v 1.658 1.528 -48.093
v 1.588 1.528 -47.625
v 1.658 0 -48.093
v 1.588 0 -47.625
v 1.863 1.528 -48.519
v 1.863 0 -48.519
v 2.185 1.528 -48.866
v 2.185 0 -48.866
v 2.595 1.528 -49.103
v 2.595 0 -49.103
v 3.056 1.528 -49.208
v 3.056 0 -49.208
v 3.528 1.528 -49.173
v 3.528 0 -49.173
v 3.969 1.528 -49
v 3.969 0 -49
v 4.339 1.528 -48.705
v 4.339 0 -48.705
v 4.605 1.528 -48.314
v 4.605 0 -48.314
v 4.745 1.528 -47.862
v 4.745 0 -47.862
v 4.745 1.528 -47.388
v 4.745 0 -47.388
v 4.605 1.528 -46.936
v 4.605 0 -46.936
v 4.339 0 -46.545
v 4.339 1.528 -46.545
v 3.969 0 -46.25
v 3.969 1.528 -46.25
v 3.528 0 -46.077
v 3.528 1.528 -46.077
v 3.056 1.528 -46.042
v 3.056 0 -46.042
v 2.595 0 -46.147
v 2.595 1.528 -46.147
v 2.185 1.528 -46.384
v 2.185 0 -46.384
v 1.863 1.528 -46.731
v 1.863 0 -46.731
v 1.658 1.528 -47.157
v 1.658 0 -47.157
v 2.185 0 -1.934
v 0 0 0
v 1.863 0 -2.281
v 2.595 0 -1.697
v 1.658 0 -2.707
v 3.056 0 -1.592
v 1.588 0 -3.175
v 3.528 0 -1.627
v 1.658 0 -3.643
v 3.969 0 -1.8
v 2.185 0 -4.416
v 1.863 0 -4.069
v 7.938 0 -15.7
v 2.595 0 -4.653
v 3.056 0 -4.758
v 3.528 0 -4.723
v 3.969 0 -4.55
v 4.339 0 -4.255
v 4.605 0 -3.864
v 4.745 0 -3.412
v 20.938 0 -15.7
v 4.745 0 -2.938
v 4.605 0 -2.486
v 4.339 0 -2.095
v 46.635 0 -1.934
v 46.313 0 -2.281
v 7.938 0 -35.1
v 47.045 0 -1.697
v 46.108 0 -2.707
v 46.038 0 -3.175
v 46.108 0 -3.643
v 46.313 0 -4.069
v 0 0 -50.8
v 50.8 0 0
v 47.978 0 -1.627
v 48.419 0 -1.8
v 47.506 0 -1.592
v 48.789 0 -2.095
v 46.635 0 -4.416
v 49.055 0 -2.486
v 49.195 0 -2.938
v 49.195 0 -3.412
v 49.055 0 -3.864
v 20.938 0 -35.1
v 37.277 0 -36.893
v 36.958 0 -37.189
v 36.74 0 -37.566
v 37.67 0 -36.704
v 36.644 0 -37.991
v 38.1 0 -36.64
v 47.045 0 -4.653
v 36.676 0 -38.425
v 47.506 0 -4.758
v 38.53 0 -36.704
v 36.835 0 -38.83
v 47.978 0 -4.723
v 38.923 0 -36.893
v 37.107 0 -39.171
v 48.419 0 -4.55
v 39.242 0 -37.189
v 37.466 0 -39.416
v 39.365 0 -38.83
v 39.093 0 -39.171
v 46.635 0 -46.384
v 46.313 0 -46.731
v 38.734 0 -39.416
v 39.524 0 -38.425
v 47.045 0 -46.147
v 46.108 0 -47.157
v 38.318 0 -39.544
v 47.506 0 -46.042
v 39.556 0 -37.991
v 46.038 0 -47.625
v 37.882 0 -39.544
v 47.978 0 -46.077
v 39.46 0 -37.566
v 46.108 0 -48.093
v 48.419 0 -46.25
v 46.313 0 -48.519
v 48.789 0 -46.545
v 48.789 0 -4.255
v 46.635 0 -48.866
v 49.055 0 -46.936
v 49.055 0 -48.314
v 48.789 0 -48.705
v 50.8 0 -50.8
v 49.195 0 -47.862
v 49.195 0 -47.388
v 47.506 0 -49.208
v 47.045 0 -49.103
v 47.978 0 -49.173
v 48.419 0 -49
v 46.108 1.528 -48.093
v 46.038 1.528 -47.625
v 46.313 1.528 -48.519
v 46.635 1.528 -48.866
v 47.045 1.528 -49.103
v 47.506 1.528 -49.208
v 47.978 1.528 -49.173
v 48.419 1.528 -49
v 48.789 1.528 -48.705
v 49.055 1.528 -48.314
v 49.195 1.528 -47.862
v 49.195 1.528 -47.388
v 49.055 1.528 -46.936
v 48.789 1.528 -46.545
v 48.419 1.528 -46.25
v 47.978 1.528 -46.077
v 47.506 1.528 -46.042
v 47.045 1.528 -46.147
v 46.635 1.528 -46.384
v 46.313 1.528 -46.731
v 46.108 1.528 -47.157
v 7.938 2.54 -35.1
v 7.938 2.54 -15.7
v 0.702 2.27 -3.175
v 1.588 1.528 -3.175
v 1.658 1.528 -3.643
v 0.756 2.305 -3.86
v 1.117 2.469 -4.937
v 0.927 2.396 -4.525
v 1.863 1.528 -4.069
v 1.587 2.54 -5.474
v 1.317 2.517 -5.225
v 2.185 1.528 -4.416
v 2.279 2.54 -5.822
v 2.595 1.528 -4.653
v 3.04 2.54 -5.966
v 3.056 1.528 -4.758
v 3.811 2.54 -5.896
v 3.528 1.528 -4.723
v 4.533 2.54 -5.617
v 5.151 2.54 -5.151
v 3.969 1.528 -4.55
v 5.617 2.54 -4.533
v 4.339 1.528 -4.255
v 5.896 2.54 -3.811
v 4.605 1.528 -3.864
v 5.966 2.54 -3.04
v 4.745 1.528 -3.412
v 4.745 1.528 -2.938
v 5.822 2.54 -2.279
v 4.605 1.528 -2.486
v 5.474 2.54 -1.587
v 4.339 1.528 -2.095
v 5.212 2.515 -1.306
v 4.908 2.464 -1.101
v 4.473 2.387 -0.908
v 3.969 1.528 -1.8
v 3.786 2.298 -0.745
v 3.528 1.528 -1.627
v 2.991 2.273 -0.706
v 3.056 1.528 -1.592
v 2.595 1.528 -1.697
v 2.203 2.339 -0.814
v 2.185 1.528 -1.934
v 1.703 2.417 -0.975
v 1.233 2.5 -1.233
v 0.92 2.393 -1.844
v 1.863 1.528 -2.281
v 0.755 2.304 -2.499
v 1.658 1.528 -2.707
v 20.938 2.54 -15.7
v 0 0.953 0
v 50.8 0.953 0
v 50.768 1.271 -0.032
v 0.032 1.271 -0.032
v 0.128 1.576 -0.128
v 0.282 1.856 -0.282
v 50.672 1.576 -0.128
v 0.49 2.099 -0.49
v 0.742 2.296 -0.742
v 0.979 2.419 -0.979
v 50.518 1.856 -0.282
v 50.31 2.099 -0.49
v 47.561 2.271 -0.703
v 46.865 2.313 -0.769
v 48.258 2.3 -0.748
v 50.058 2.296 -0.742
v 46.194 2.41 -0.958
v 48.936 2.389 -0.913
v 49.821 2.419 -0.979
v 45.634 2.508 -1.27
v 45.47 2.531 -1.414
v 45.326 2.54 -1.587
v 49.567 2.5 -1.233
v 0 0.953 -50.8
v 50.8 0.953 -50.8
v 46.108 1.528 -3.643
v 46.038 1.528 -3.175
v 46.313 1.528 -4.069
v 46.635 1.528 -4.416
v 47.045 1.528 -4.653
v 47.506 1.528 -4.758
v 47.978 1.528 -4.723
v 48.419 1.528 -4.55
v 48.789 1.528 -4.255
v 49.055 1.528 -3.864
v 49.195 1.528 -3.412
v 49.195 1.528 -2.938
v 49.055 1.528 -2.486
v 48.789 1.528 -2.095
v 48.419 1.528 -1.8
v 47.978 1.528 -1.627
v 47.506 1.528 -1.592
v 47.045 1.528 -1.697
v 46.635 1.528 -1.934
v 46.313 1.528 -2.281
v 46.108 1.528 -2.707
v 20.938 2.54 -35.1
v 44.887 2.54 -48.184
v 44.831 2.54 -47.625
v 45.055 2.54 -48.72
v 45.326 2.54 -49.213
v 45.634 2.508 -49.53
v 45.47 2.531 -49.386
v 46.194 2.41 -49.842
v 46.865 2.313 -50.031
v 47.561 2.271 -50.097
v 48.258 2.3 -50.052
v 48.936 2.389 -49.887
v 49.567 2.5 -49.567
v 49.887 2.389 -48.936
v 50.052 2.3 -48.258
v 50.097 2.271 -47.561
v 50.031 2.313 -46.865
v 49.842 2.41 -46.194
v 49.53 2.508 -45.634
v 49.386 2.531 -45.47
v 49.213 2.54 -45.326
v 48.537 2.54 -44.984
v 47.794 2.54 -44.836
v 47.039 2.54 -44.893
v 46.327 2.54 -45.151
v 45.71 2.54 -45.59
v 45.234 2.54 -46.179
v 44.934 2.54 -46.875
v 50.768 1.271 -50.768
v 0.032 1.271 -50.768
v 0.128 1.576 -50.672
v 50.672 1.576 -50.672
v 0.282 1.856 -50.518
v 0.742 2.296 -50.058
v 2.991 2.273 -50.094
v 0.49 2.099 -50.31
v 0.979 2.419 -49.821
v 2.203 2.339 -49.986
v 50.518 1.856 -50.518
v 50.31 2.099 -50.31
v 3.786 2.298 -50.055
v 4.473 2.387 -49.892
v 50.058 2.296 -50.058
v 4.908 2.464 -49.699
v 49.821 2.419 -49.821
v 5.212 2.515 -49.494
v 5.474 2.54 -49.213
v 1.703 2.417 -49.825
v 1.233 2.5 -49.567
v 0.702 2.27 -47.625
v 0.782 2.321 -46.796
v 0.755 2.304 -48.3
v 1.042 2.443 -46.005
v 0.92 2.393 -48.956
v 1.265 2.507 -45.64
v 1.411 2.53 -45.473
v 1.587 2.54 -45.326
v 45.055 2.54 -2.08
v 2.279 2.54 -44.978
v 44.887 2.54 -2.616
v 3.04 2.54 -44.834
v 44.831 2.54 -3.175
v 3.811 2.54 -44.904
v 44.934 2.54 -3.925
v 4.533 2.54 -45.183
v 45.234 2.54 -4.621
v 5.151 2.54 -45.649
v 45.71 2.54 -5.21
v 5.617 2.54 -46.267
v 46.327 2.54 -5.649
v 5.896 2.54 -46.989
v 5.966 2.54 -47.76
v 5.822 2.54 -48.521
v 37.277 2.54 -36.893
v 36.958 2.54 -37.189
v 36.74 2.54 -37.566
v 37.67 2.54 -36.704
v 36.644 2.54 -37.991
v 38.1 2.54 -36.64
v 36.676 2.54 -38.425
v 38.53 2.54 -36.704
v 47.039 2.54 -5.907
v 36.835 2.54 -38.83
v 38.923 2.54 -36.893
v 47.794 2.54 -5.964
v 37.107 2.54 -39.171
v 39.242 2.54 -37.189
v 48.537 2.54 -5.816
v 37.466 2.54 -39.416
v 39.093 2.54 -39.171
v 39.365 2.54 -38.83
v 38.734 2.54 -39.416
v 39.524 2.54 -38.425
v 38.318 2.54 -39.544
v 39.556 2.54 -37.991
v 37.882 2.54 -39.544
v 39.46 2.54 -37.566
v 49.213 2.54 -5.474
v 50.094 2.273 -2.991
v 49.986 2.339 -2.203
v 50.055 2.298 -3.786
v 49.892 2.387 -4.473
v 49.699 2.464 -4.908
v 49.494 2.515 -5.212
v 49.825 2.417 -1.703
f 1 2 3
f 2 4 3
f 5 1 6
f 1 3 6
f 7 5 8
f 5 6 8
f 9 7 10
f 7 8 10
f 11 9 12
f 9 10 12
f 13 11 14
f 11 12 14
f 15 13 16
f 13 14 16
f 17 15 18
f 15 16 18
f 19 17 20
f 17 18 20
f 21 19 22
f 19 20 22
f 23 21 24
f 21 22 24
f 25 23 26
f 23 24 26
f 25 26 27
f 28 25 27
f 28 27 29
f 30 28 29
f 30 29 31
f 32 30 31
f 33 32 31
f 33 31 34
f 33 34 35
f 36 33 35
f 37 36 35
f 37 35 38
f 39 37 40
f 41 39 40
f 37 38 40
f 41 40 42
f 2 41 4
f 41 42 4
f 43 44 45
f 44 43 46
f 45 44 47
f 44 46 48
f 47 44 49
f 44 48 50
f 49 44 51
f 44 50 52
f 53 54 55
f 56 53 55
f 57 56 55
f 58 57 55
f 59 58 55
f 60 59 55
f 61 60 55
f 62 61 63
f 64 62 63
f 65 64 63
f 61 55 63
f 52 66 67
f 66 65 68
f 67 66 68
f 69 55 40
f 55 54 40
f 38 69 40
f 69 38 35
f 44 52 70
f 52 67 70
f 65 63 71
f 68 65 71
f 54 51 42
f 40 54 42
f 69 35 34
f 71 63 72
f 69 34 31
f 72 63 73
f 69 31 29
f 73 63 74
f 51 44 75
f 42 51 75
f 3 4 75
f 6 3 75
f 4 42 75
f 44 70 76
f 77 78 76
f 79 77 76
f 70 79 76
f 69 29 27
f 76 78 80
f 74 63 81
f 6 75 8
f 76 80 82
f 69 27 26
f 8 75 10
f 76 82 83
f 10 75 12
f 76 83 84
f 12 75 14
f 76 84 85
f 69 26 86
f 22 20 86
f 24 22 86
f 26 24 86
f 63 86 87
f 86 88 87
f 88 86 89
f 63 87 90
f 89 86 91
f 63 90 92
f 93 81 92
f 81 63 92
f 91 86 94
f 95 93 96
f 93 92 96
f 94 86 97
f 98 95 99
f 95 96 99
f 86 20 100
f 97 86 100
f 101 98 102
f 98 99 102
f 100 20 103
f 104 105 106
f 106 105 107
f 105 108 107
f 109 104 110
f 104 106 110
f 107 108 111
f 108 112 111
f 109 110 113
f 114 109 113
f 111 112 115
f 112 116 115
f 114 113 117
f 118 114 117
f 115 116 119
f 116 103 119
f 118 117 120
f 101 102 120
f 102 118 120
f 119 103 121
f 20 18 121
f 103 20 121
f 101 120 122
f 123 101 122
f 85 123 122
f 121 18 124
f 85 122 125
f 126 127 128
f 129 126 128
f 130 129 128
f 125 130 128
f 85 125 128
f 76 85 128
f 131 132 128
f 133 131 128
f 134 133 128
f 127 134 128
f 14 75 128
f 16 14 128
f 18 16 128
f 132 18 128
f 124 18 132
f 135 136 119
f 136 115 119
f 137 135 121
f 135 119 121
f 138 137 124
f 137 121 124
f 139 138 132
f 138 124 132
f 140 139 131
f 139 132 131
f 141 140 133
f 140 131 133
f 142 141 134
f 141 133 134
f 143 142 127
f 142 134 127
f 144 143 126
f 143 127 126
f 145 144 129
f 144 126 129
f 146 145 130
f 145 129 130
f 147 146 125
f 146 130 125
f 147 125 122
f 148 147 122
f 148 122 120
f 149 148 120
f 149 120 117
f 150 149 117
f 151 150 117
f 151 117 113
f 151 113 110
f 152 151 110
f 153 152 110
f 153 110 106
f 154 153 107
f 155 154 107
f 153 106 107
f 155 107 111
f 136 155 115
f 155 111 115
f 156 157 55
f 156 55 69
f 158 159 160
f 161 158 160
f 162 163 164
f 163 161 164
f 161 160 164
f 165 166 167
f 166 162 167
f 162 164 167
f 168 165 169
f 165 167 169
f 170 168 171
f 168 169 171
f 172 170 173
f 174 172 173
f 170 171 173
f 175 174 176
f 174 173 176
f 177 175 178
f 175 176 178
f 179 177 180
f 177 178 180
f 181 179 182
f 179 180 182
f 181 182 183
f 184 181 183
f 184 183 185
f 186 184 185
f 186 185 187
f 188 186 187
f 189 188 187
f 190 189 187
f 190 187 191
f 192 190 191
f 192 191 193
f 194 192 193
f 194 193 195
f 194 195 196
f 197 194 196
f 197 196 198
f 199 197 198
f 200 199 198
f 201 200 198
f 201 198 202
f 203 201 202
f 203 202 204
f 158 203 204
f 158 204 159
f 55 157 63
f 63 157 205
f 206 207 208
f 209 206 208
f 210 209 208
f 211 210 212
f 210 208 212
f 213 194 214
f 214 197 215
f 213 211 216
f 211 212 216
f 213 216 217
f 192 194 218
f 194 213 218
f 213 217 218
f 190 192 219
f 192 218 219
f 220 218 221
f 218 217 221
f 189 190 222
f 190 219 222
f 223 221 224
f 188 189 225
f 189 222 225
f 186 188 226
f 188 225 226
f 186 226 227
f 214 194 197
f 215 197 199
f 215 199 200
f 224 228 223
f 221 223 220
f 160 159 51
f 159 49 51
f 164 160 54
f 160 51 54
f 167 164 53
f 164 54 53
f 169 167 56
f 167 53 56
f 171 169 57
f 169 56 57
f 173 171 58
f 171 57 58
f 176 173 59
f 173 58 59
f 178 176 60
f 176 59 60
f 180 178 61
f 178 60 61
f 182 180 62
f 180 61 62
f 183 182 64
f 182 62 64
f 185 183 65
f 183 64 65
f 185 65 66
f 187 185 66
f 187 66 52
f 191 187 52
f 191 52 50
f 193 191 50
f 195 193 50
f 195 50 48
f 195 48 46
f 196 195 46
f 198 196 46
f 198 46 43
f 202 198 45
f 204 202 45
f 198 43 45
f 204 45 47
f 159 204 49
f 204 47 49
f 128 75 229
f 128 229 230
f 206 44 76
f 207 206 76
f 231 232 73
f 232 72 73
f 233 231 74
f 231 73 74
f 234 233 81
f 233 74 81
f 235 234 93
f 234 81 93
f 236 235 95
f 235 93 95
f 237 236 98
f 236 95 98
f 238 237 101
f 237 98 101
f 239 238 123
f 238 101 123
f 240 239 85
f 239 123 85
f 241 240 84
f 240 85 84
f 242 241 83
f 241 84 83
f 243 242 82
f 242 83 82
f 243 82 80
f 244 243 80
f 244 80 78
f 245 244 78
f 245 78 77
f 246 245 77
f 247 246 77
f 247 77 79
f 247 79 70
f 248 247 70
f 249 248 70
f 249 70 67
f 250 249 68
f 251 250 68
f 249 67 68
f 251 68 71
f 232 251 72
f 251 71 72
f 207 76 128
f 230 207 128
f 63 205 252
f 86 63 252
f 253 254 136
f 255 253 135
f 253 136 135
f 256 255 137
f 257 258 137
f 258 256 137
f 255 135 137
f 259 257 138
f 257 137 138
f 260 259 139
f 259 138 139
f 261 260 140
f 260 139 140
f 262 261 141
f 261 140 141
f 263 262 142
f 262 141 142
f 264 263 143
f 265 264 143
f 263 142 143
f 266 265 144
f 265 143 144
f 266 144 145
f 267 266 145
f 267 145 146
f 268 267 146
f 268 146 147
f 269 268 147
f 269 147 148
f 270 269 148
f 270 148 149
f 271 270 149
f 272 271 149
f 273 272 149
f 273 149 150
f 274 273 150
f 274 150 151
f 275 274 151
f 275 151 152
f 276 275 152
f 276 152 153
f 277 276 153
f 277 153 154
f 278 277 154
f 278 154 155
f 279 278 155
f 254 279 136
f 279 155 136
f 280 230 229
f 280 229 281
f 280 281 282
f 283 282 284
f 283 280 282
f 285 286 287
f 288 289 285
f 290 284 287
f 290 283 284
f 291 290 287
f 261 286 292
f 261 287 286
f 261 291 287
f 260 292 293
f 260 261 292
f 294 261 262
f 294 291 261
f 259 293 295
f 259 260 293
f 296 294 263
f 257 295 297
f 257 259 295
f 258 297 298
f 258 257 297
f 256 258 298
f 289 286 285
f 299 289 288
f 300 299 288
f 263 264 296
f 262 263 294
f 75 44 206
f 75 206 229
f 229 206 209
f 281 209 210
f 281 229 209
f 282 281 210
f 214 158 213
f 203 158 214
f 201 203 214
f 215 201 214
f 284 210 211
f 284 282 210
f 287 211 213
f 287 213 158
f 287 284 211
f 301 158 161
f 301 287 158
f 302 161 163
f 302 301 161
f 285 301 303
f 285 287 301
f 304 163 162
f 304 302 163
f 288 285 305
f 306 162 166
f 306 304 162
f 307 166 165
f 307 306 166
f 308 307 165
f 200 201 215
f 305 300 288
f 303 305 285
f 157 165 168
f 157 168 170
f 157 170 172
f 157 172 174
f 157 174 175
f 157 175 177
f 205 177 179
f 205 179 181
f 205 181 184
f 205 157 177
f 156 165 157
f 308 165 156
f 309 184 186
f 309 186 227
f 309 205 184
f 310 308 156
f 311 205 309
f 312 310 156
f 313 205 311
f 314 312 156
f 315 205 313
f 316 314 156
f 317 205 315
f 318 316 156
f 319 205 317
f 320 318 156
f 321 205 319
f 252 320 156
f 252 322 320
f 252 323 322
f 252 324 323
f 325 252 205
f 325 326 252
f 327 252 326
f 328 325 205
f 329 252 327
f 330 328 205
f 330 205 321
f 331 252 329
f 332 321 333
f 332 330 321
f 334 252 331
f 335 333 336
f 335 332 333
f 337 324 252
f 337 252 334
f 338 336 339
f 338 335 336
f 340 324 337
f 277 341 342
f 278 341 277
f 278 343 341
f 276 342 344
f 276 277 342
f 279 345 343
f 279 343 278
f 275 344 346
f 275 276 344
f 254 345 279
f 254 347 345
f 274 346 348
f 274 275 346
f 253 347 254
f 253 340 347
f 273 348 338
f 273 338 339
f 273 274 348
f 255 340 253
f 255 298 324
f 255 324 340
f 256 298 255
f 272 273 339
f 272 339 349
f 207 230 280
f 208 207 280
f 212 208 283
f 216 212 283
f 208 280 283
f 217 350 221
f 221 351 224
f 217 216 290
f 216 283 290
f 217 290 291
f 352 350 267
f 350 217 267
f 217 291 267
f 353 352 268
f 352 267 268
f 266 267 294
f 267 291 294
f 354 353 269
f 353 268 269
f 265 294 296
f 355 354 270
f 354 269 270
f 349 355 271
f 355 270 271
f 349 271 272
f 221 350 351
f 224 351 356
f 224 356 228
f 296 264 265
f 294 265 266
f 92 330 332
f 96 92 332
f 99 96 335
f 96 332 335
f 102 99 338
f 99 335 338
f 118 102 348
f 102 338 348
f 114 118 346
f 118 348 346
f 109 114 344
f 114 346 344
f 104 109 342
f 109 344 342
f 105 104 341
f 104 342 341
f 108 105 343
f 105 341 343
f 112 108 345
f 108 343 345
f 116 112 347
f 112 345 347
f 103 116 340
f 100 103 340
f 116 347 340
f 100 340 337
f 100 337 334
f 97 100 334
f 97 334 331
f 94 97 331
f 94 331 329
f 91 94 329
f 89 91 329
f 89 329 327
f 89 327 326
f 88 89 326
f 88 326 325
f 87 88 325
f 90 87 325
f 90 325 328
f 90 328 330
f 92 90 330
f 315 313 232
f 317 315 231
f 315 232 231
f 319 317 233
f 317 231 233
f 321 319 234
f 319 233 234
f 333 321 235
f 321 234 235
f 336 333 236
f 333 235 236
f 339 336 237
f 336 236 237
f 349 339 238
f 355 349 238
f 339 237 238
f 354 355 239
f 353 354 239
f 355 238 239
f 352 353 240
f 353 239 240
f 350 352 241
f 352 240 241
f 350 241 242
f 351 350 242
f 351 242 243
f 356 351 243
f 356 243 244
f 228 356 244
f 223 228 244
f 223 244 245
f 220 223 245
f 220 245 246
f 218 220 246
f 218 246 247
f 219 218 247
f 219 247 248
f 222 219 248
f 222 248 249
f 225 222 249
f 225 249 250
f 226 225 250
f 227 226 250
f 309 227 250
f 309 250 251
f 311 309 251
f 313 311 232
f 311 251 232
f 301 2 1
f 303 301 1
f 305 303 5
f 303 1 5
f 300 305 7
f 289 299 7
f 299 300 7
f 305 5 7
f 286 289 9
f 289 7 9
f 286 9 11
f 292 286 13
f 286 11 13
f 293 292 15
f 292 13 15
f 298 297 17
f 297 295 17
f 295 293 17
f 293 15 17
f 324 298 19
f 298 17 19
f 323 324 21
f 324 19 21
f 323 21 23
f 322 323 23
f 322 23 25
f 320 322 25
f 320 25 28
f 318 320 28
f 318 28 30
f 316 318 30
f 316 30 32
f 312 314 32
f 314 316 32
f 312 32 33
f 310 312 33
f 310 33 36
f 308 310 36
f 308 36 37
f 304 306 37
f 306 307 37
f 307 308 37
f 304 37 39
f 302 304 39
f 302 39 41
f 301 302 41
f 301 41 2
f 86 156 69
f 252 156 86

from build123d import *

# Parameters (mm, degrees)
SKETCH1_W                                       = 50.8
SKETCH1_H                                       = 50.8
BOSS_EXTRUDE1_DEPTH                             = 2.54
FILLET1_R                                       = 1.5875
CSK_FOR_M3_FLAT_HEAD_MACHINE_SCREW1_D           = 3.175
CSK_FOR_M3_FLAT_HEAD_MACHINE_SCREW1_CSINK_D     = 5.588
CSK_FOR_M3_FLAT_HEAD_MACHINE_SCREW1_CSINK_ANGLE = 100
SKETCH4_W                                       = 13
SKETCH4_H                                       = 19.4
CUT_EXTRUDE1_DEPTH                              = 72.886936368
SKETCH5_R                                       = 1.4605
CUT_EXTRUDE2_DEPTH                              = 72.886936368


with BuildPart() as part:
    # Sketch1 → Boss-Extrude1 (new body)
    with BuildSketch(Plane(origin=(0, 0, 0), x_dir=(1, 0, 0), z_dir=(0, 1, 0))):
        with Locations((25.4, 25.4)):
            Rectangle(SKETCH1_W, SKETCH1_H)
    extrude(amount=BOSS_EXTRUDE1_DEPTH)

    # Fillet1
    fillet1_edges = [part.edges().sort_by_distance(p)[0] for p in [
        (50.8, 2.54, -25.4),
        (25.4, 2.54, -50.8),
        (0, 2.54, -25.4),
        (25.4, 2.54, 0),
    ]]
    fillet(fillet1_edges, radius=FILLET1_R)

    # CSK for M3 Flat Head Machine Screw1 (through all)
    with Locations(Plane(origin=(0, 2.54, 0), x_dir=(1, 0, 0), z_dir=(0, 1, 0))):
        with Locations((3.175, 47.625), (47.625, 47.625), (47.625, 3.175), (3.175, 3.175)):
            CounterSinkHole(CSK_FOR_M3_FLAT_HEAD_MACHINE_SCREW1_D / 2, CSK_FOR_M3_FLAT_HEAD_MACHINE_SCREW1_CSINK_D / 2, counter_sink_angle=CSK_FOR_M3_FLAT_HEAD_MACHINE_SCREW1_CSINK_ANGLE)

    # Sketch4 → Cut-Extrude1 (cut, through all)
    with BuildSketch(Plane(origin=(0, 2.54, 0), x_dir=(1, 0, 0), z_dir=(0, 1, 0))):
        with Locations((14.4375, 25.4)):
            Rectangle(SKETCH4_W, SKETCH4_H)
    extrude(amount=-CUT_EXTRUDE1_DEPTH, mode=Mode.SUBTRACT)

    # Sketch5 → Cut-Extrude2 (cut, through all)
    with BuildSketch(Plane(origin=(0, 2.54, 0), x_dir=(1, 0, 0), z_dir=(0, 1, 0))):
        with Locations(Location((38.1, 38.1, 0), (0, 0, 270))):
            Circle(SKETCH5_R)
    extrude(amount=-CUT_EXTRUDE2_DEPTH, mode=Mode.SUBTRACT)


solid = part.part
